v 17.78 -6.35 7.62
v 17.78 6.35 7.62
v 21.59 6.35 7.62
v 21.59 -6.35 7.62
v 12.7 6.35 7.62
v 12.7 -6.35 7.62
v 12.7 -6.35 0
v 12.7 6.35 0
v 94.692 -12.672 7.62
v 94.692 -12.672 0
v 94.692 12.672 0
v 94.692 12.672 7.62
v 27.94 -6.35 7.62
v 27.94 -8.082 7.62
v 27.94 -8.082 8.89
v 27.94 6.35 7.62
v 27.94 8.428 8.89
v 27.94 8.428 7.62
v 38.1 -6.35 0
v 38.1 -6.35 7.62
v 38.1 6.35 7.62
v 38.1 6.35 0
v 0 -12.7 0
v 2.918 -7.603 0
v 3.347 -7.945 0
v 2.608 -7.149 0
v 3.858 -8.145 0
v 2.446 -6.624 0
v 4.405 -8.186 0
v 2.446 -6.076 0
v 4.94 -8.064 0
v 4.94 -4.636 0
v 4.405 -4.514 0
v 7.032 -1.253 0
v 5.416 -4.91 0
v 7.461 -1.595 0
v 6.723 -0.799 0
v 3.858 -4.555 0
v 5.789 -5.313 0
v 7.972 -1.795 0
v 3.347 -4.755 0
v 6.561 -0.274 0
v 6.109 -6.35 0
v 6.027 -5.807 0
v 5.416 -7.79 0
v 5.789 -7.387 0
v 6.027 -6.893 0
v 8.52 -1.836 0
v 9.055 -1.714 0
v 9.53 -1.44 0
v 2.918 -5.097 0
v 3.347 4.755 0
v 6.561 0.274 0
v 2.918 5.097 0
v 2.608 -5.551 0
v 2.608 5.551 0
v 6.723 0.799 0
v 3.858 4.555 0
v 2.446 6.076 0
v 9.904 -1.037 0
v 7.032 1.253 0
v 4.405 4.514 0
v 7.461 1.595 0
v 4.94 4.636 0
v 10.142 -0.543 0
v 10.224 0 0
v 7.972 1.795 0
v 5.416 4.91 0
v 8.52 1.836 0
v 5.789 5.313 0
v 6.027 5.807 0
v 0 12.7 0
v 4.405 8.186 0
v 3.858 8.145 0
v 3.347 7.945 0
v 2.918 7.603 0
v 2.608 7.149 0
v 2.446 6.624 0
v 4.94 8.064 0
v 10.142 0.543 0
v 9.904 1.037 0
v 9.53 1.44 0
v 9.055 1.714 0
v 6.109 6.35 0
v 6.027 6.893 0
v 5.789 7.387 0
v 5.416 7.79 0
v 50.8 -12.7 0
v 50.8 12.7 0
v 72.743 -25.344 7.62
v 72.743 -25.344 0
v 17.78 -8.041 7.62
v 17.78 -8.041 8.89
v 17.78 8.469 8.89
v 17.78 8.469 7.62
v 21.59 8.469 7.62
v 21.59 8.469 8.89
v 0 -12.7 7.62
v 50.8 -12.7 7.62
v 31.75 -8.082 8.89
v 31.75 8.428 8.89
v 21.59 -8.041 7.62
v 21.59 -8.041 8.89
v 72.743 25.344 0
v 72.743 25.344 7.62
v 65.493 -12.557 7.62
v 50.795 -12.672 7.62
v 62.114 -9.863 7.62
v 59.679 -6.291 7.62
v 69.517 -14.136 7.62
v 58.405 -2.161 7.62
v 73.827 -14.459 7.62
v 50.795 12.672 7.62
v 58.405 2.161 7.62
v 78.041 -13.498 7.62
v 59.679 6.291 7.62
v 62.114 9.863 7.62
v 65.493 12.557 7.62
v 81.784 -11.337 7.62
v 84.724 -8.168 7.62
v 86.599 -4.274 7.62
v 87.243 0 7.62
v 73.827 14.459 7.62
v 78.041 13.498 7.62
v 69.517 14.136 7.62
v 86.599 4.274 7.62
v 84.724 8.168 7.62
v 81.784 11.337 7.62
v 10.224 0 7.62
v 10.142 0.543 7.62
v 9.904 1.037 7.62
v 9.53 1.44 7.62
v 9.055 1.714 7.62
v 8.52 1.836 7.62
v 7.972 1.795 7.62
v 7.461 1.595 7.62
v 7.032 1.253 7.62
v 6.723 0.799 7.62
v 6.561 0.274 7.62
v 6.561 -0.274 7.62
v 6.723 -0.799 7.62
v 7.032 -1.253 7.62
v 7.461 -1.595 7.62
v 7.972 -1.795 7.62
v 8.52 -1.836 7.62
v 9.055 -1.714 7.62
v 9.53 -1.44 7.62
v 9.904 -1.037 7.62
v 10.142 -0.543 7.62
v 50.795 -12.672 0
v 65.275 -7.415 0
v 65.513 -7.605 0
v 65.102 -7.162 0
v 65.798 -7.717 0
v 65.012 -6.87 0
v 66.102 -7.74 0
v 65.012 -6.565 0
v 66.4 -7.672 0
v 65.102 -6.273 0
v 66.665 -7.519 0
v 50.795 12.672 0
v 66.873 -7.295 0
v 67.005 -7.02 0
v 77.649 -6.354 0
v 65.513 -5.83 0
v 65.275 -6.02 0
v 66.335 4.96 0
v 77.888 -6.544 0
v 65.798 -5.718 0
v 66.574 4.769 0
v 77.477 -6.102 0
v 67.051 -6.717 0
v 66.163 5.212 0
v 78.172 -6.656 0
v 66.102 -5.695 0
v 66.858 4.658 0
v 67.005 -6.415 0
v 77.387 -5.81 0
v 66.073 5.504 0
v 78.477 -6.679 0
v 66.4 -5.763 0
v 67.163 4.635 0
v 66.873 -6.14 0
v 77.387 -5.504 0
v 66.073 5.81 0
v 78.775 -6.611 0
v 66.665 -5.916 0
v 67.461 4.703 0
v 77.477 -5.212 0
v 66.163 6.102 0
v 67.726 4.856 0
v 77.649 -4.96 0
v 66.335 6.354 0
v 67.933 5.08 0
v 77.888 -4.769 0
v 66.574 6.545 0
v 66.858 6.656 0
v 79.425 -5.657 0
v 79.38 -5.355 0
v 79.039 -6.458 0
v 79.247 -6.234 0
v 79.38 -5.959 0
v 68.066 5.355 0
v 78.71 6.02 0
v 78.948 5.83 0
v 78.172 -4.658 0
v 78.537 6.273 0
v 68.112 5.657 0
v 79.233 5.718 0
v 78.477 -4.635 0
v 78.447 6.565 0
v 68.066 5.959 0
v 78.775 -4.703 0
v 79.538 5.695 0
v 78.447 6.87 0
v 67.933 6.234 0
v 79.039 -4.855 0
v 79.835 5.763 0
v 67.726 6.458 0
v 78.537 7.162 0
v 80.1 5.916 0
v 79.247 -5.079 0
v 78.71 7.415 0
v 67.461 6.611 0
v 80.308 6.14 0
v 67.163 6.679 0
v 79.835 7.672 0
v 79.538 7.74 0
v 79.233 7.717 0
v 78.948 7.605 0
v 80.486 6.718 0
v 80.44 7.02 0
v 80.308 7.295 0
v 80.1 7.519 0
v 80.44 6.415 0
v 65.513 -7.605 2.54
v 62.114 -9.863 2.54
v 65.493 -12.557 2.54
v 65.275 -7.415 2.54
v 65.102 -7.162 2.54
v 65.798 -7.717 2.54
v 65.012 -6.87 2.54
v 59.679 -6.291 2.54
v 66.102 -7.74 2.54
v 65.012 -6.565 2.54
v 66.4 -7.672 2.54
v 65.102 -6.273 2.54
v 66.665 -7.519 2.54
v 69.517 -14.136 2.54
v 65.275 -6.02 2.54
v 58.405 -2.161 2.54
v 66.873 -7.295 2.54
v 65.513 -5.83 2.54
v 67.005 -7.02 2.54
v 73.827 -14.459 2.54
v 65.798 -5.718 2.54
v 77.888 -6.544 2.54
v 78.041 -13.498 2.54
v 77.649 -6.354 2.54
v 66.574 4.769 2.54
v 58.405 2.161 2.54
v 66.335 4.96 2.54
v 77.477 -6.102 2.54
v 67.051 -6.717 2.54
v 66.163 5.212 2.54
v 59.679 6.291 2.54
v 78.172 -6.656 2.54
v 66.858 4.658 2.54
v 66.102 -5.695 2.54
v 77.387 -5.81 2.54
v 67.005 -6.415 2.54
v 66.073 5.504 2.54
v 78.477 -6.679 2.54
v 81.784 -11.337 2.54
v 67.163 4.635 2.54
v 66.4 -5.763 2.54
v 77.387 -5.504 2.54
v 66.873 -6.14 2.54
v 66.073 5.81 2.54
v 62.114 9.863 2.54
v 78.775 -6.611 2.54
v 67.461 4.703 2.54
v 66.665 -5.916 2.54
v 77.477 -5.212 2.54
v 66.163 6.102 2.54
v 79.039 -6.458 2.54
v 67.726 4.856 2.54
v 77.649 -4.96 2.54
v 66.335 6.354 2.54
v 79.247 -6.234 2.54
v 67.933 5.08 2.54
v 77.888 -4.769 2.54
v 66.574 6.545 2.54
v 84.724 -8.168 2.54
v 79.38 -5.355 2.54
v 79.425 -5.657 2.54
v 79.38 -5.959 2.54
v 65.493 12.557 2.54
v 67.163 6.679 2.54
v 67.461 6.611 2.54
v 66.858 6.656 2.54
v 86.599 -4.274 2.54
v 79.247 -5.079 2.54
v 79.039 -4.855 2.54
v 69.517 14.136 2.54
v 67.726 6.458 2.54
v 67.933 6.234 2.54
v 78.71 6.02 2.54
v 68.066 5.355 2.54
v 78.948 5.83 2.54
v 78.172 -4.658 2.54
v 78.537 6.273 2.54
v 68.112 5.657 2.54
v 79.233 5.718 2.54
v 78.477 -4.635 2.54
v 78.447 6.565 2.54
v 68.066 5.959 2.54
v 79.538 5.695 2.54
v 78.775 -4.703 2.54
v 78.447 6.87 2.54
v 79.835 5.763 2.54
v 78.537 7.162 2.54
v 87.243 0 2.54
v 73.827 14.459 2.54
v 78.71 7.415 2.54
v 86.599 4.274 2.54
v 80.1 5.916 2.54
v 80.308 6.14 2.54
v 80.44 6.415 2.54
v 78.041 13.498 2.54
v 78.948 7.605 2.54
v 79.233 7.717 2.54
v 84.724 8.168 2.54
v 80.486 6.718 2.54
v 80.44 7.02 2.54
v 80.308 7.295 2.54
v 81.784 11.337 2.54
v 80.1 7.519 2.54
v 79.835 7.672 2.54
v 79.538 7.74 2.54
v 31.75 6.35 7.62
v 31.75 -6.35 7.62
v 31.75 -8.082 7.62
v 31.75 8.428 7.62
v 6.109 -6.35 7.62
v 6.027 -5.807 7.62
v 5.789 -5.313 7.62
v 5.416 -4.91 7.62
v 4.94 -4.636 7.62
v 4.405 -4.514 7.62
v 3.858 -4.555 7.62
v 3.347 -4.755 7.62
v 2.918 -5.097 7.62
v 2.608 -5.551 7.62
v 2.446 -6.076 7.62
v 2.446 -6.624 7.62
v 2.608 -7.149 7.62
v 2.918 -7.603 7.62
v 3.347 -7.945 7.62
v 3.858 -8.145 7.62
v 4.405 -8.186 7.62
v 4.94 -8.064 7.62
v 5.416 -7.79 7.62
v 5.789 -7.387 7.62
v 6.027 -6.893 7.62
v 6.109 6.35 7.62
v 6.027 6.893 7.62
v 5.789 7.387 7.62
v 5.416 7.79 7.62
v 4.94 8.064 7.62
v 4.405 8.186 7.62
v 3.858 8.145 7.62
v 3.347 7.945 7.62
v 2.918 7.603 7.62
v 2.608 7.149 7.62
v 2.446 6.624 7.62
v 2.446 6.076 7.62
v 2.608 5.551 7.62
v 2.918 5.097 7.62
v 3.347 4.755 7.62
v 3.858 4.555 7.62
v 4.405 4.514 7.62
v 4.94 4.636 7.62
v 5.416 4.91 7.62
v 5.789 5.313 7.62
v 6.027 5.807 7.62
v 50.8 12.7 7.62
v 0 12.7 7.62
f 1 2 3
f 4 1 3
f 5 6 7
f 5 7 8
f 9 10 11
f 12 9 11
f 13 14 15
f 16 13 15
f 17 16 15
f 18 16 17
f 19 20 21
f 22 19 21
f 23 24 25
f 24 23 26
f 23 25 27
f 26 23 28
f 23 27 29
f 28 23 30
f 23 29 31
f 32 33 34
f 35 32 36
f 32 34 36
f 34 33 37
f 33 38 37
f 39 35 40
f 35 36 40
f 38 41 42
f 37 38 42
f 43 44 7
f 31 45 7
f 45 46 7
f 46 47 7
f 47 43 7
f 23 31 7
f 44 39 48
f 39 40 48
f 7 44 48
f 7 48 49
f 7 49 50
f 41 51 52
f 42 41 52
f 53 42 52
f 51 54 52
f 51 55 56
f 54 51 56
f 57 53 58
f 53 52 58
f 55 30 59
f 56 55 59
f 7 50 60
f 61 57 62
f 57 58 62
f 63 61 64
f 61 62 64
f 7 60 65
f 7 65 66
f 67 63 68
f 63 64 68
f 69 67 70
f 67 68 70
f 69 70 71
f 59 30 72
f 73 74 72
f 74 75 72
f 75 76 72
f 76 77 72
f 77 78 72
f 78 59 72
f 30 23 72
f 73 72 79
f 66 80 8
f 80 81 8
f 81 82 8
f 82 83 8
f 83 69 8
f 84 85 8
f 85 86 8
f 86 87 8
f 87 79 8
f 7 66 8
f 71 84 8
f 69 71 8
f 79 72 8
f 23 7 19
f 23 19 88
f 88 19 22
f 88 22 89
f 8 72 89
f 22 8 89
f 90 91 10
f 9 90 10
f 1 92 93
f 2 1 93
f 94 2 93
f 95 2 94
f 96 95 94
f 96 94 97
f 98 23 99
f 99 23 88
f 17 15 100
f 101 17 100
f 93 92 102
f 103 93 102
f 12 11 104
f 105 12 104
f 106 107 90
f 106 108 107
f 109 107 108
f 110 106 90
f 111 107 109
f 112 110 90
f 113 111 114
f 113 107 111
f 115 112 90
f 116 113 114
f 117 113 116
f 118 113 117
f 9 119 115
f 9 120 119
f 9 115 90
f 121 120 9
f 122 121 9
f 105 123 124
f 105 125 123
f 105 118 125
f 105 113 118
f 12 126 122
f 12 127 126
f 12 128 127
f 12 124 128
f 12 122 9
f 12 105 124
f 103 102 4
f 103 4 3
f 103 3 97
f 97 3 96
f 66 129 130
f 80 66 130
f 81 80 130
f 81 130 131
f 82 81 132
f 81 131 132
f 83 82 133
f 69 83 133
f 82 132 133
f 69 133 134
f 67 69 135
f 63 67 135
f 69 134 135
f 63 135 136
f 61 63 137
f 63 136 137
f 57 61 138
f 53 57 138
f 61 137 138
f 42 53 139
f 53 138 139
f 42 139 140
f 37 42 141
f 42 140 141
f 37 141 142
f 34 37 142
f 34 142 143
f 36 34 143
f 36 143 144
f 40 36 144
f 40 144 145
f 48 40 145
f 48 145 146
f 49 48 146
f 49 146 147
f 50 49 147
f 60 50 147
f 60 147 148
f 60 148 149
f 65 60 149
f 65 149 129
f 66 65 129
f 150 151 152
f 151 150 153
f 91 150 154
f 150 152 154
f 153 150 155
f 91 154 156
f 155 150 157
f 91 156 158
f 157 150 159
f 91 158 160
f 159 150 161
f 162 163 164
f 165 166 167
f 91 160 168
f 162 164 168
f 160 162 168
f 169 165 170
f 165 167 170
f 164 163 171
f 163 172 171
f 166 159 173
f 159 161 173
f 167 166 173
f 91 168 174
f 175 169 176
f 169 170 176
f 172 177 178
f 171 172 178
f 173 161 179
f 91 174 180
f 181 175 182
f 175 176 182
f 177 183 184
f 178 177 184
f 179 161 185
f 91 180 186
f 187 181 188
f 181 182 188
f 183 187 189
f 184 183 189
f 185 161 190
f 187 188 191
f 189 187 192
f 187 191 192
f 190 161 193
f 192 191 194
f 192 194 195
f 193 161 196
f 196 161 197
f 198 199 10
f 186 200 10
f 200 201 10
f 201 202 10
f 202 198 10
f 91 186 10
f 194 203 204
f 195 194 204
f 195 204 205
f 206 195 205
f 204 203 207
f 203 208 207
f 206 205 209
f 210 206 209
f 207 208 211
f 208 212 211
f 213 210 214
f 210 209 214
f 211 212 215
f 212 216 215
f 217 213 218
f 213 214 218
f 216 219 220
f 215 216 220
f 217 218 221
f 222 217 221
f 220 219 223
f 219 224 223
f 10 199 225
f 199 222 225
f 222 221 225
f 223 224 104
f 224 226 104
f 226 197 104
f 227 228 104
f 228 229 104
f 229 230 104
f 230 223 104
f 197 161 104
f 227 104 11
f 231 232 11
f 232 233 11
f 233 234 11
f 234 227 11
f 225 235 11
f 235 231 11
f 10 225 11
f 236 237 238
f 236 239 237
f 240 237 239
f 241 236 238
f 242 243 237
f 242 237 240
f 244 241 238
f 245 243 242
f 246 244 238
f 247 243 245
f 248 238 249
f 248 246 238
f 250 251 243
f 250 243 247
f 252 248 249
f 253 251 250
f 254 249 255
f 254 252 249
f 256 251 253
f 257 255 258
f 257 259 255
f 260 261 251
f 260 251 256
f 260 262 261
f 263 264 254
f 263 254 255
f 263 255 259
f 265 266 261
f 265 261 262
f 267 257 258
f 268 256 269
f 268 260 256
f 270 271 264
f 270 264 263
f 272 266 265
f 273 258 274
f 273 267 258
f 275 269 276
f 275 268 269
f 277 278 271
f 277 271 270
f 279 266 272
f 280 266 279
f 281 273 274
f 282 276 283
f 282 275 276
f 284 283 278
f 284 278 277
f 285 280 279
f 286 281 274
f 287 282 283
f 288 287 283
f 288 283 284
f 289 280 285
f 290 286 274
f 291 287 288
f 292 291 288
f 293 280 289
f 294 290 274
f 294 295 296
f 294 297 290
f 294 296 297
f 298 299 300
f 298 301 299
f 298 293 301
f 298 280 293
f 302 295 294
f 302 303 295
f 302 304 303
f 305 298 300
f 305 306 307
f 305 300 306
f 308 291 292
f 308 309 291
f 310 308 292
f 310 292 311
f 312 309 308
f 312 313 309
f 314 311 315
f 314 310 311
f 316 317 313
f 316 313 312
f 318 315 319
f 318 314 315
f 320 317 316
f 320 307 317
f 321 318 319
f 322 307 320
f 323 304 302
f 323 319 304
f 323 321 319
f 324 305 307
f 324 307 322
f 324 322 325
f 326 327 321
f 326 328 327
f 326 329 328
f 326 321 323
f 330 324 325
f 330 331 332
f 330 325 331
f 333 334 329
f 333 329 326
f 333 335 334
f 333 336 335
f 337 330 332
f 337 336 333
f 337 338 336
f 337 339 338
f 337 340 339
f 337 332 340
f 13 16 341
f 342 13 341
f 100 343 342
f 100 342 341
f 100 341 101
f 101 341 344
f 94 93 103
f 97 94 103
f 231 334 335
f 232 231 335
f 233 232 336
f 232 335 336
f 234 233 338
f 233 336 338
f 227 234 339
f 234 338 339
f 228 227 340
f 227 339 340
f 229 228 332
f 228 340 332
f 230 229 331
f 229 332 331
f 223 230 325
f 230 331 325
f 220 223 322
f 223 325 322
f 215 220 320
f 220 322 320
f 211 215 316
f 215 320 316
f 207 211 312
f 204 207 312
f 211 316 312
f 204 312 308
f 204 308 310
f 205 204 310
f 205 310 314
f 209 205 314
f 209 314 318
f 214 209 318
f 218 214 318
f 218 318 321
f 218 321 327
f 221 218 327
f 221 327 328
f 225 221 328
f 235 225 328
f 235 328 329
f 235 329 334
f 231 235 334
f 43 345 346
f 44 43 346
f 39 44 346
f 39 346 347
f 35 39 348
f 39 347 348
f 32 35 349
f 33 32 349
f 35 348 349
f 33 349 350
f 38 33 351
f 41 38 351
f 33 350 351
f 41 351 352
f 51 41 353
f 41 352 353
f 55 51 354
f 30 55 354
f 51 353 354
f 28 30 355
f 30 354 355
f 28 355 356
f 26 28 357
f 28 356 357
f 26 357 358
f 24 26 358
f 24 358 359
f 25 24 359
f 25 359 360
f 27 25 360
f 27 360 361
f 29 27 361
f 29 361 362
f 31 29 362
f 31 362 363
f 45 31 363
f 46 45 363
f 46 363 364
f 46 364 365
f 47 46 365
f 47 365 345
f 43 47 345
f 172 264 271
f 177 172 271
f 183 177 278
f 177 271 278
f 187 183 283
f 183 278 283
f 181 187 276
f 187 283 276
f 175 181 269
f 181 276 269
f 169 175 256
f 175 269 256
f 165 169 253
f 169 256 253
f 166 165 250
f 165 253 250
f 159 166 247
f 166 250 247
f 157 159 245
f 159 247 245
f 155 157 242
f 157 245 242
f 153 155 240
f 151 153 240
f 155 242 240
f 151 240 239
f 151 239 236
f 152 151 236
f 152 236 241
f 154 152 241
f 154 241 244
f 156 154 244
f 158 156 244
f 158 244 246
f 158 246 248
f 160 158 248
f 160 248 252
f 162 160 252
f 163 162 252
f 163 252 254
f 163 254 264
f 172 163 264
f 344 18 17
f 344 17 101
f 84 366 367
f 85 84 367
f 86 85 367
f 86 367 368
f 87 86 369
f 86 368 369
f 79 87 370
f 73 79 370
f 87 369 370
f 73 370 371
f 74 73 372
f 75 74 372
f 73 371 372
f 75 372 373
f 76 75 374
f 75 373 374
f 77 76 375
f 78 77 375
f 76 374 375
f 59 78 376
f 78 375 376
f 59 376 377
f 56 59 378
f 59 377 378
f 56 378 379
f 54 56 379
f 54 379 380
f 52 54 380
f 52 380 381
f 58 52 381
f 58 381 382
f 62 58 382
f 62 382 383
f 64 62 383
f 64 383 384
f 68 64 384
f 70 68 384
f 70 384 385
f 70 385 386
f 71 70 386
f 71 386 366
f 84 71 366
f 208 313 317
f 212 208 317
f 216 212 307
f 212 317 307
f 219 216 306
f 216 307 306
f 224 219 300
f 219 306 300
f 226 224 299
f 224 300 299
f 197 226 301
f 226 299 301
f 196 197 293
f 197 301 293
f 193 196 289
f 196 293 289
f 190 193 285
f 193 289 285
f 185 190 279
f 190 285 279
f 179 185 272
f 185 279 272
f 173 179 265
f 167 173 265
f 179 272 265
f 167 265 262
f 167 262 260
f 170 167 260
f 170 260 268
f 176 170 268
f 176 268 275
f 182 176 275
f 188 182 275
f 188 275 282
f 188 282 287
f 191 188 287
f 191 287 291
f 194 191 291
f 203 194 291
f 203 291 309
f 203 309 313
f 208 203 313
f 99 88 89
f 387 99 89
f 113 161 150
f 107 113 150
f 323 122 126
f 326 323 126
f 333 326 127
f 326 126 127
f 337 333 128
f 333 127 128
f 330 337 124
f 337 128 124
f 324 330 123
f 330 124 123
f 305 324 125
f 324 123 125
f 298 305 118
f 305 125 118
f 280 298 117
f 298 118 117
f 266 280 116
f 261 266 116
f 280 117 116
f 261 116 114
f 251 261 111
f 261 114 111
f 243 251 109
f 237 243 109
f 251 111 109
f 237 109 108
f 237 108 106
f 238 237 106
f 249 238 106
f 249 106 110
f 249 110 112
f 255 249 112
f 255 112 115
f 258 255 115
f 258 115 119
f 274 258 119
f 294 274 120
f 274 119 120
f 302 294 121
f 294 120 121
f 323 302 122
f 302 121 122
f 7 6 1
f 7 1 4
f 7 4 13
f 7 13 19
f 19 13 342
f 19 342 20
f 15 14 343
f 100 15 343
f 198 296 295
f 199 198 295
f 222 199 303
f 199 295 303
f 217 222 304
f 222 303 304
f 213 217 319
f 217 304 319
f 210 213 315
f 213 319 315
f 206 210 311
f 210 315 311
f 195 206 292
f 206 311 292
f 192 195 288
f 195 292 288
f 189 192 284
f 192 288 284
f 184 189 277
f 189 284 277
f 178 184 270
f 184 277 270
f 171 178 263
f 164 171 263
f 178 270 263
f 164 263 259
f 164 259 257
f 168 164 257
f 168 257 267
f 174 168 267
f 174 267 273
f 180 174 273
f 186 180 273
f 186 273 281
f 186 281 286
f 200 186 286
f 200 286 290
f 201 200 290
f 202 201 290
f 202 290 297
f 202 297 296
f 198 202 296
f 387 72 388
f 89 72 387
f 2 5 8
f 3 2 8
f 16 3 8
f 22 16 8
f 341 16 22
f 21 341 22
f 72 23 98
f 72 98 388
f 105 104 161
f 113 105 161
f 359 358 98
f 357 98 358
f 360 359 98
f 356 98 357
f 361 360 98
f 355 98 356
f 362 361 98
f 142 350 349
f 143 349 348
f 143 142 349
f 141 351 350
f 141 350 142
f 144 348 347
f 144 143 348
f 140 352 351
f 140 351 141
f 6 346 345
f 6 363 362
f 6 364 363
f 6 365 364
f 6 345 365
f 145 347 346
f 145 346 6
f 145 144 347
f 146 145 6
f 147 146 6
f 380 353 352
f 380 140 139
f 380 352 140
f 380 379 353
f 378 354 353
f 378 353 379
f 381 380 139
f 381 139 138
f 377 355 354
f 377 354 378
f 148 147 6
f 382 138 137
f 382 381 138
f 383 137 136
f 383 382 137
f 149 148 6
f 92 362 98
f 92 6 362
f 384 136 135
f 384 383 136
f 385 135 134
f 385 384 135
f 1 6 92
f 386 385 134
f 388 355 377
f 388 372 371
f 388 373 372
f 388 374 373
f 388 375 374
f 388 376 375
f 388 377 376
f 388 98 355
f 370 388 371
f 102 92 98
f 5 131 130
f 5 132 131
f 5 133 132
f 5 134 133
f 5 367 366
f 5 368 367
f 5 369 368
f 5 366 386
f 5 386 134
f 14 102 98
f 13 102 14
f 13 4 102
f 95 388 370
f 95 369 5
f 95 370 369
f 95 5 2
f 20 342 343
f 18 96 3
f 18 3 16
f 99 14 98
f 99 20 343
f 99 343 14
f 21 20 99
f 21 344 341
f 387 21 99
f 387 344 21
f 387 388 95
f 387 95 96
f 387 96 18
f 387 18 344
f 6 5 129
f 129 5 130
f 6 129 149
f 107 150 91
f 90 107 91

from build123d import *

# Parameters (mm, degrees)
F0_W      = 50.8
F0_H      = 25.4
F1_DEPTH  = 7.62
F3_DEPTH  = 7.62
F4_W      = 25.4
F4_H      = 12.7
F5_DEPTH  = 7.621
F6_R      = 14.5
F7_DEPTH  = 5.08
F9_R      = 1.025
F13_DEPTH = 2.541
F10_R     = 1.025
F14_DEPTH = 2.541
F11_R     = 1.025
F15_DEPTH = 2.541
F12_R     = 1.025
F16_DEPTH = 2.541
F17_W     = 3.81
F17_H     = 16.51
F18_DEPTH = 1.27
F19_R     = 1.8415
F20_DEPTH = 7.621


with BuildPart() as f1:
    # F0 (on Top) → F1 (new body)
    with BuildSketch(Plane.XY):
        with Locations((25.4, 0)):
            Rectangle(F0_W, F0_H)
    extrude(amount=F1_DEPTH)

    # F4 (on face) → F5 (cut, through all)
    with BuildSketch(Plane.XY.offset(7.62)):
        with Locations((25.4, 0)):
            Rectangle(F4_W, F4_H)
    extrude(amount=-F5_DEPTH, mode=Mode.SUBTRACT)

    # F17 (on face) → F18 (join)
    with BuildSketch(Plane.XY.offset(7.62)):
        with Locations((19.685, 0.213849)):
            Rectangle(F17_W, F17_H)
        with Locations((29.845, 0.173433)):
            Rectangle(F17_W, F17_H)
    extrude(amount=F18_DEPTH)

    # F19 (on face) → F20 (cut, through all)
    with BuildSketch(Plane.XY.offset(7.62)):
        with Locations((4.26742, 6.35)):
            Circle(F19_R)
        with Locations((4.26742, -6.35)):
            Circle(F19_R)
        with Locations((8.38222, 0)):
            Circle(F19_R)
    extrude(amount=-F20_DEPTH, mode=Mode.SUBTRACT)


with BuildPart() as f3:
    # F2 (on Top) → F3 (new body)
    with BuildSketch(Plane.XY):
        Polygon((94.692336, -12.672174), (94.692336, 12.672174), (72.743488, 25.344348), (50.794639, 12.672174), (50.794639, -12.672174), (72.743488, -25.344348), align=None)
    extrude(amount=F3_DEPTH)

    # F6 (on face) → F7 (cut)
    with BuildSketch(Plane.XY.offset(7.62)):
        with Locations((72.743488, 0)):
            Circle(F6_R)
    extrude(amount=-F7_DEPTH, mode=Mode.SUBTRACT)

    # F9 (on face) → F13 (cut, through all)
    with BuildSketch(Plane.XY.offset(2.54)):
        with Locations((67.086555, 5.656938)):
            Circle(F9_R)
    extrude(amount=-F13_DEPTH, mode=Mode.SUBTRACT)

    # F10 (on face) → F14 (cut, through all)
    with BuildSketch(Plane.XY.offset(2.54)):
        with Locations((79.460986, 6.717544)):
            Circle(F10_R)
    extrude(amount=-F14_DEPTH, mode=Mode.SUBTRACT)

    # F11 (on face) → F15 (cut, through all)
    with BuildSketch(Plane.XY.offset(2.54)):
        with Locations((78.400277, -5.656807)):
            Circle(F11_R)
    extrude(amount=-F15_DEPTH, mode=Mode.SUBTRACT)

    # F12 (on face) → F16 (cut, through all)
    with BuildSketch(Plane.XY.offset(2.54)):
        with Locations((66.025883, -6.717487)):
            Circle(F12_R)
    extrude(amount=-F16_DEPTH, mode=Mode.SUBTRACT)


solid = Compound([f1.part, f3.part])
